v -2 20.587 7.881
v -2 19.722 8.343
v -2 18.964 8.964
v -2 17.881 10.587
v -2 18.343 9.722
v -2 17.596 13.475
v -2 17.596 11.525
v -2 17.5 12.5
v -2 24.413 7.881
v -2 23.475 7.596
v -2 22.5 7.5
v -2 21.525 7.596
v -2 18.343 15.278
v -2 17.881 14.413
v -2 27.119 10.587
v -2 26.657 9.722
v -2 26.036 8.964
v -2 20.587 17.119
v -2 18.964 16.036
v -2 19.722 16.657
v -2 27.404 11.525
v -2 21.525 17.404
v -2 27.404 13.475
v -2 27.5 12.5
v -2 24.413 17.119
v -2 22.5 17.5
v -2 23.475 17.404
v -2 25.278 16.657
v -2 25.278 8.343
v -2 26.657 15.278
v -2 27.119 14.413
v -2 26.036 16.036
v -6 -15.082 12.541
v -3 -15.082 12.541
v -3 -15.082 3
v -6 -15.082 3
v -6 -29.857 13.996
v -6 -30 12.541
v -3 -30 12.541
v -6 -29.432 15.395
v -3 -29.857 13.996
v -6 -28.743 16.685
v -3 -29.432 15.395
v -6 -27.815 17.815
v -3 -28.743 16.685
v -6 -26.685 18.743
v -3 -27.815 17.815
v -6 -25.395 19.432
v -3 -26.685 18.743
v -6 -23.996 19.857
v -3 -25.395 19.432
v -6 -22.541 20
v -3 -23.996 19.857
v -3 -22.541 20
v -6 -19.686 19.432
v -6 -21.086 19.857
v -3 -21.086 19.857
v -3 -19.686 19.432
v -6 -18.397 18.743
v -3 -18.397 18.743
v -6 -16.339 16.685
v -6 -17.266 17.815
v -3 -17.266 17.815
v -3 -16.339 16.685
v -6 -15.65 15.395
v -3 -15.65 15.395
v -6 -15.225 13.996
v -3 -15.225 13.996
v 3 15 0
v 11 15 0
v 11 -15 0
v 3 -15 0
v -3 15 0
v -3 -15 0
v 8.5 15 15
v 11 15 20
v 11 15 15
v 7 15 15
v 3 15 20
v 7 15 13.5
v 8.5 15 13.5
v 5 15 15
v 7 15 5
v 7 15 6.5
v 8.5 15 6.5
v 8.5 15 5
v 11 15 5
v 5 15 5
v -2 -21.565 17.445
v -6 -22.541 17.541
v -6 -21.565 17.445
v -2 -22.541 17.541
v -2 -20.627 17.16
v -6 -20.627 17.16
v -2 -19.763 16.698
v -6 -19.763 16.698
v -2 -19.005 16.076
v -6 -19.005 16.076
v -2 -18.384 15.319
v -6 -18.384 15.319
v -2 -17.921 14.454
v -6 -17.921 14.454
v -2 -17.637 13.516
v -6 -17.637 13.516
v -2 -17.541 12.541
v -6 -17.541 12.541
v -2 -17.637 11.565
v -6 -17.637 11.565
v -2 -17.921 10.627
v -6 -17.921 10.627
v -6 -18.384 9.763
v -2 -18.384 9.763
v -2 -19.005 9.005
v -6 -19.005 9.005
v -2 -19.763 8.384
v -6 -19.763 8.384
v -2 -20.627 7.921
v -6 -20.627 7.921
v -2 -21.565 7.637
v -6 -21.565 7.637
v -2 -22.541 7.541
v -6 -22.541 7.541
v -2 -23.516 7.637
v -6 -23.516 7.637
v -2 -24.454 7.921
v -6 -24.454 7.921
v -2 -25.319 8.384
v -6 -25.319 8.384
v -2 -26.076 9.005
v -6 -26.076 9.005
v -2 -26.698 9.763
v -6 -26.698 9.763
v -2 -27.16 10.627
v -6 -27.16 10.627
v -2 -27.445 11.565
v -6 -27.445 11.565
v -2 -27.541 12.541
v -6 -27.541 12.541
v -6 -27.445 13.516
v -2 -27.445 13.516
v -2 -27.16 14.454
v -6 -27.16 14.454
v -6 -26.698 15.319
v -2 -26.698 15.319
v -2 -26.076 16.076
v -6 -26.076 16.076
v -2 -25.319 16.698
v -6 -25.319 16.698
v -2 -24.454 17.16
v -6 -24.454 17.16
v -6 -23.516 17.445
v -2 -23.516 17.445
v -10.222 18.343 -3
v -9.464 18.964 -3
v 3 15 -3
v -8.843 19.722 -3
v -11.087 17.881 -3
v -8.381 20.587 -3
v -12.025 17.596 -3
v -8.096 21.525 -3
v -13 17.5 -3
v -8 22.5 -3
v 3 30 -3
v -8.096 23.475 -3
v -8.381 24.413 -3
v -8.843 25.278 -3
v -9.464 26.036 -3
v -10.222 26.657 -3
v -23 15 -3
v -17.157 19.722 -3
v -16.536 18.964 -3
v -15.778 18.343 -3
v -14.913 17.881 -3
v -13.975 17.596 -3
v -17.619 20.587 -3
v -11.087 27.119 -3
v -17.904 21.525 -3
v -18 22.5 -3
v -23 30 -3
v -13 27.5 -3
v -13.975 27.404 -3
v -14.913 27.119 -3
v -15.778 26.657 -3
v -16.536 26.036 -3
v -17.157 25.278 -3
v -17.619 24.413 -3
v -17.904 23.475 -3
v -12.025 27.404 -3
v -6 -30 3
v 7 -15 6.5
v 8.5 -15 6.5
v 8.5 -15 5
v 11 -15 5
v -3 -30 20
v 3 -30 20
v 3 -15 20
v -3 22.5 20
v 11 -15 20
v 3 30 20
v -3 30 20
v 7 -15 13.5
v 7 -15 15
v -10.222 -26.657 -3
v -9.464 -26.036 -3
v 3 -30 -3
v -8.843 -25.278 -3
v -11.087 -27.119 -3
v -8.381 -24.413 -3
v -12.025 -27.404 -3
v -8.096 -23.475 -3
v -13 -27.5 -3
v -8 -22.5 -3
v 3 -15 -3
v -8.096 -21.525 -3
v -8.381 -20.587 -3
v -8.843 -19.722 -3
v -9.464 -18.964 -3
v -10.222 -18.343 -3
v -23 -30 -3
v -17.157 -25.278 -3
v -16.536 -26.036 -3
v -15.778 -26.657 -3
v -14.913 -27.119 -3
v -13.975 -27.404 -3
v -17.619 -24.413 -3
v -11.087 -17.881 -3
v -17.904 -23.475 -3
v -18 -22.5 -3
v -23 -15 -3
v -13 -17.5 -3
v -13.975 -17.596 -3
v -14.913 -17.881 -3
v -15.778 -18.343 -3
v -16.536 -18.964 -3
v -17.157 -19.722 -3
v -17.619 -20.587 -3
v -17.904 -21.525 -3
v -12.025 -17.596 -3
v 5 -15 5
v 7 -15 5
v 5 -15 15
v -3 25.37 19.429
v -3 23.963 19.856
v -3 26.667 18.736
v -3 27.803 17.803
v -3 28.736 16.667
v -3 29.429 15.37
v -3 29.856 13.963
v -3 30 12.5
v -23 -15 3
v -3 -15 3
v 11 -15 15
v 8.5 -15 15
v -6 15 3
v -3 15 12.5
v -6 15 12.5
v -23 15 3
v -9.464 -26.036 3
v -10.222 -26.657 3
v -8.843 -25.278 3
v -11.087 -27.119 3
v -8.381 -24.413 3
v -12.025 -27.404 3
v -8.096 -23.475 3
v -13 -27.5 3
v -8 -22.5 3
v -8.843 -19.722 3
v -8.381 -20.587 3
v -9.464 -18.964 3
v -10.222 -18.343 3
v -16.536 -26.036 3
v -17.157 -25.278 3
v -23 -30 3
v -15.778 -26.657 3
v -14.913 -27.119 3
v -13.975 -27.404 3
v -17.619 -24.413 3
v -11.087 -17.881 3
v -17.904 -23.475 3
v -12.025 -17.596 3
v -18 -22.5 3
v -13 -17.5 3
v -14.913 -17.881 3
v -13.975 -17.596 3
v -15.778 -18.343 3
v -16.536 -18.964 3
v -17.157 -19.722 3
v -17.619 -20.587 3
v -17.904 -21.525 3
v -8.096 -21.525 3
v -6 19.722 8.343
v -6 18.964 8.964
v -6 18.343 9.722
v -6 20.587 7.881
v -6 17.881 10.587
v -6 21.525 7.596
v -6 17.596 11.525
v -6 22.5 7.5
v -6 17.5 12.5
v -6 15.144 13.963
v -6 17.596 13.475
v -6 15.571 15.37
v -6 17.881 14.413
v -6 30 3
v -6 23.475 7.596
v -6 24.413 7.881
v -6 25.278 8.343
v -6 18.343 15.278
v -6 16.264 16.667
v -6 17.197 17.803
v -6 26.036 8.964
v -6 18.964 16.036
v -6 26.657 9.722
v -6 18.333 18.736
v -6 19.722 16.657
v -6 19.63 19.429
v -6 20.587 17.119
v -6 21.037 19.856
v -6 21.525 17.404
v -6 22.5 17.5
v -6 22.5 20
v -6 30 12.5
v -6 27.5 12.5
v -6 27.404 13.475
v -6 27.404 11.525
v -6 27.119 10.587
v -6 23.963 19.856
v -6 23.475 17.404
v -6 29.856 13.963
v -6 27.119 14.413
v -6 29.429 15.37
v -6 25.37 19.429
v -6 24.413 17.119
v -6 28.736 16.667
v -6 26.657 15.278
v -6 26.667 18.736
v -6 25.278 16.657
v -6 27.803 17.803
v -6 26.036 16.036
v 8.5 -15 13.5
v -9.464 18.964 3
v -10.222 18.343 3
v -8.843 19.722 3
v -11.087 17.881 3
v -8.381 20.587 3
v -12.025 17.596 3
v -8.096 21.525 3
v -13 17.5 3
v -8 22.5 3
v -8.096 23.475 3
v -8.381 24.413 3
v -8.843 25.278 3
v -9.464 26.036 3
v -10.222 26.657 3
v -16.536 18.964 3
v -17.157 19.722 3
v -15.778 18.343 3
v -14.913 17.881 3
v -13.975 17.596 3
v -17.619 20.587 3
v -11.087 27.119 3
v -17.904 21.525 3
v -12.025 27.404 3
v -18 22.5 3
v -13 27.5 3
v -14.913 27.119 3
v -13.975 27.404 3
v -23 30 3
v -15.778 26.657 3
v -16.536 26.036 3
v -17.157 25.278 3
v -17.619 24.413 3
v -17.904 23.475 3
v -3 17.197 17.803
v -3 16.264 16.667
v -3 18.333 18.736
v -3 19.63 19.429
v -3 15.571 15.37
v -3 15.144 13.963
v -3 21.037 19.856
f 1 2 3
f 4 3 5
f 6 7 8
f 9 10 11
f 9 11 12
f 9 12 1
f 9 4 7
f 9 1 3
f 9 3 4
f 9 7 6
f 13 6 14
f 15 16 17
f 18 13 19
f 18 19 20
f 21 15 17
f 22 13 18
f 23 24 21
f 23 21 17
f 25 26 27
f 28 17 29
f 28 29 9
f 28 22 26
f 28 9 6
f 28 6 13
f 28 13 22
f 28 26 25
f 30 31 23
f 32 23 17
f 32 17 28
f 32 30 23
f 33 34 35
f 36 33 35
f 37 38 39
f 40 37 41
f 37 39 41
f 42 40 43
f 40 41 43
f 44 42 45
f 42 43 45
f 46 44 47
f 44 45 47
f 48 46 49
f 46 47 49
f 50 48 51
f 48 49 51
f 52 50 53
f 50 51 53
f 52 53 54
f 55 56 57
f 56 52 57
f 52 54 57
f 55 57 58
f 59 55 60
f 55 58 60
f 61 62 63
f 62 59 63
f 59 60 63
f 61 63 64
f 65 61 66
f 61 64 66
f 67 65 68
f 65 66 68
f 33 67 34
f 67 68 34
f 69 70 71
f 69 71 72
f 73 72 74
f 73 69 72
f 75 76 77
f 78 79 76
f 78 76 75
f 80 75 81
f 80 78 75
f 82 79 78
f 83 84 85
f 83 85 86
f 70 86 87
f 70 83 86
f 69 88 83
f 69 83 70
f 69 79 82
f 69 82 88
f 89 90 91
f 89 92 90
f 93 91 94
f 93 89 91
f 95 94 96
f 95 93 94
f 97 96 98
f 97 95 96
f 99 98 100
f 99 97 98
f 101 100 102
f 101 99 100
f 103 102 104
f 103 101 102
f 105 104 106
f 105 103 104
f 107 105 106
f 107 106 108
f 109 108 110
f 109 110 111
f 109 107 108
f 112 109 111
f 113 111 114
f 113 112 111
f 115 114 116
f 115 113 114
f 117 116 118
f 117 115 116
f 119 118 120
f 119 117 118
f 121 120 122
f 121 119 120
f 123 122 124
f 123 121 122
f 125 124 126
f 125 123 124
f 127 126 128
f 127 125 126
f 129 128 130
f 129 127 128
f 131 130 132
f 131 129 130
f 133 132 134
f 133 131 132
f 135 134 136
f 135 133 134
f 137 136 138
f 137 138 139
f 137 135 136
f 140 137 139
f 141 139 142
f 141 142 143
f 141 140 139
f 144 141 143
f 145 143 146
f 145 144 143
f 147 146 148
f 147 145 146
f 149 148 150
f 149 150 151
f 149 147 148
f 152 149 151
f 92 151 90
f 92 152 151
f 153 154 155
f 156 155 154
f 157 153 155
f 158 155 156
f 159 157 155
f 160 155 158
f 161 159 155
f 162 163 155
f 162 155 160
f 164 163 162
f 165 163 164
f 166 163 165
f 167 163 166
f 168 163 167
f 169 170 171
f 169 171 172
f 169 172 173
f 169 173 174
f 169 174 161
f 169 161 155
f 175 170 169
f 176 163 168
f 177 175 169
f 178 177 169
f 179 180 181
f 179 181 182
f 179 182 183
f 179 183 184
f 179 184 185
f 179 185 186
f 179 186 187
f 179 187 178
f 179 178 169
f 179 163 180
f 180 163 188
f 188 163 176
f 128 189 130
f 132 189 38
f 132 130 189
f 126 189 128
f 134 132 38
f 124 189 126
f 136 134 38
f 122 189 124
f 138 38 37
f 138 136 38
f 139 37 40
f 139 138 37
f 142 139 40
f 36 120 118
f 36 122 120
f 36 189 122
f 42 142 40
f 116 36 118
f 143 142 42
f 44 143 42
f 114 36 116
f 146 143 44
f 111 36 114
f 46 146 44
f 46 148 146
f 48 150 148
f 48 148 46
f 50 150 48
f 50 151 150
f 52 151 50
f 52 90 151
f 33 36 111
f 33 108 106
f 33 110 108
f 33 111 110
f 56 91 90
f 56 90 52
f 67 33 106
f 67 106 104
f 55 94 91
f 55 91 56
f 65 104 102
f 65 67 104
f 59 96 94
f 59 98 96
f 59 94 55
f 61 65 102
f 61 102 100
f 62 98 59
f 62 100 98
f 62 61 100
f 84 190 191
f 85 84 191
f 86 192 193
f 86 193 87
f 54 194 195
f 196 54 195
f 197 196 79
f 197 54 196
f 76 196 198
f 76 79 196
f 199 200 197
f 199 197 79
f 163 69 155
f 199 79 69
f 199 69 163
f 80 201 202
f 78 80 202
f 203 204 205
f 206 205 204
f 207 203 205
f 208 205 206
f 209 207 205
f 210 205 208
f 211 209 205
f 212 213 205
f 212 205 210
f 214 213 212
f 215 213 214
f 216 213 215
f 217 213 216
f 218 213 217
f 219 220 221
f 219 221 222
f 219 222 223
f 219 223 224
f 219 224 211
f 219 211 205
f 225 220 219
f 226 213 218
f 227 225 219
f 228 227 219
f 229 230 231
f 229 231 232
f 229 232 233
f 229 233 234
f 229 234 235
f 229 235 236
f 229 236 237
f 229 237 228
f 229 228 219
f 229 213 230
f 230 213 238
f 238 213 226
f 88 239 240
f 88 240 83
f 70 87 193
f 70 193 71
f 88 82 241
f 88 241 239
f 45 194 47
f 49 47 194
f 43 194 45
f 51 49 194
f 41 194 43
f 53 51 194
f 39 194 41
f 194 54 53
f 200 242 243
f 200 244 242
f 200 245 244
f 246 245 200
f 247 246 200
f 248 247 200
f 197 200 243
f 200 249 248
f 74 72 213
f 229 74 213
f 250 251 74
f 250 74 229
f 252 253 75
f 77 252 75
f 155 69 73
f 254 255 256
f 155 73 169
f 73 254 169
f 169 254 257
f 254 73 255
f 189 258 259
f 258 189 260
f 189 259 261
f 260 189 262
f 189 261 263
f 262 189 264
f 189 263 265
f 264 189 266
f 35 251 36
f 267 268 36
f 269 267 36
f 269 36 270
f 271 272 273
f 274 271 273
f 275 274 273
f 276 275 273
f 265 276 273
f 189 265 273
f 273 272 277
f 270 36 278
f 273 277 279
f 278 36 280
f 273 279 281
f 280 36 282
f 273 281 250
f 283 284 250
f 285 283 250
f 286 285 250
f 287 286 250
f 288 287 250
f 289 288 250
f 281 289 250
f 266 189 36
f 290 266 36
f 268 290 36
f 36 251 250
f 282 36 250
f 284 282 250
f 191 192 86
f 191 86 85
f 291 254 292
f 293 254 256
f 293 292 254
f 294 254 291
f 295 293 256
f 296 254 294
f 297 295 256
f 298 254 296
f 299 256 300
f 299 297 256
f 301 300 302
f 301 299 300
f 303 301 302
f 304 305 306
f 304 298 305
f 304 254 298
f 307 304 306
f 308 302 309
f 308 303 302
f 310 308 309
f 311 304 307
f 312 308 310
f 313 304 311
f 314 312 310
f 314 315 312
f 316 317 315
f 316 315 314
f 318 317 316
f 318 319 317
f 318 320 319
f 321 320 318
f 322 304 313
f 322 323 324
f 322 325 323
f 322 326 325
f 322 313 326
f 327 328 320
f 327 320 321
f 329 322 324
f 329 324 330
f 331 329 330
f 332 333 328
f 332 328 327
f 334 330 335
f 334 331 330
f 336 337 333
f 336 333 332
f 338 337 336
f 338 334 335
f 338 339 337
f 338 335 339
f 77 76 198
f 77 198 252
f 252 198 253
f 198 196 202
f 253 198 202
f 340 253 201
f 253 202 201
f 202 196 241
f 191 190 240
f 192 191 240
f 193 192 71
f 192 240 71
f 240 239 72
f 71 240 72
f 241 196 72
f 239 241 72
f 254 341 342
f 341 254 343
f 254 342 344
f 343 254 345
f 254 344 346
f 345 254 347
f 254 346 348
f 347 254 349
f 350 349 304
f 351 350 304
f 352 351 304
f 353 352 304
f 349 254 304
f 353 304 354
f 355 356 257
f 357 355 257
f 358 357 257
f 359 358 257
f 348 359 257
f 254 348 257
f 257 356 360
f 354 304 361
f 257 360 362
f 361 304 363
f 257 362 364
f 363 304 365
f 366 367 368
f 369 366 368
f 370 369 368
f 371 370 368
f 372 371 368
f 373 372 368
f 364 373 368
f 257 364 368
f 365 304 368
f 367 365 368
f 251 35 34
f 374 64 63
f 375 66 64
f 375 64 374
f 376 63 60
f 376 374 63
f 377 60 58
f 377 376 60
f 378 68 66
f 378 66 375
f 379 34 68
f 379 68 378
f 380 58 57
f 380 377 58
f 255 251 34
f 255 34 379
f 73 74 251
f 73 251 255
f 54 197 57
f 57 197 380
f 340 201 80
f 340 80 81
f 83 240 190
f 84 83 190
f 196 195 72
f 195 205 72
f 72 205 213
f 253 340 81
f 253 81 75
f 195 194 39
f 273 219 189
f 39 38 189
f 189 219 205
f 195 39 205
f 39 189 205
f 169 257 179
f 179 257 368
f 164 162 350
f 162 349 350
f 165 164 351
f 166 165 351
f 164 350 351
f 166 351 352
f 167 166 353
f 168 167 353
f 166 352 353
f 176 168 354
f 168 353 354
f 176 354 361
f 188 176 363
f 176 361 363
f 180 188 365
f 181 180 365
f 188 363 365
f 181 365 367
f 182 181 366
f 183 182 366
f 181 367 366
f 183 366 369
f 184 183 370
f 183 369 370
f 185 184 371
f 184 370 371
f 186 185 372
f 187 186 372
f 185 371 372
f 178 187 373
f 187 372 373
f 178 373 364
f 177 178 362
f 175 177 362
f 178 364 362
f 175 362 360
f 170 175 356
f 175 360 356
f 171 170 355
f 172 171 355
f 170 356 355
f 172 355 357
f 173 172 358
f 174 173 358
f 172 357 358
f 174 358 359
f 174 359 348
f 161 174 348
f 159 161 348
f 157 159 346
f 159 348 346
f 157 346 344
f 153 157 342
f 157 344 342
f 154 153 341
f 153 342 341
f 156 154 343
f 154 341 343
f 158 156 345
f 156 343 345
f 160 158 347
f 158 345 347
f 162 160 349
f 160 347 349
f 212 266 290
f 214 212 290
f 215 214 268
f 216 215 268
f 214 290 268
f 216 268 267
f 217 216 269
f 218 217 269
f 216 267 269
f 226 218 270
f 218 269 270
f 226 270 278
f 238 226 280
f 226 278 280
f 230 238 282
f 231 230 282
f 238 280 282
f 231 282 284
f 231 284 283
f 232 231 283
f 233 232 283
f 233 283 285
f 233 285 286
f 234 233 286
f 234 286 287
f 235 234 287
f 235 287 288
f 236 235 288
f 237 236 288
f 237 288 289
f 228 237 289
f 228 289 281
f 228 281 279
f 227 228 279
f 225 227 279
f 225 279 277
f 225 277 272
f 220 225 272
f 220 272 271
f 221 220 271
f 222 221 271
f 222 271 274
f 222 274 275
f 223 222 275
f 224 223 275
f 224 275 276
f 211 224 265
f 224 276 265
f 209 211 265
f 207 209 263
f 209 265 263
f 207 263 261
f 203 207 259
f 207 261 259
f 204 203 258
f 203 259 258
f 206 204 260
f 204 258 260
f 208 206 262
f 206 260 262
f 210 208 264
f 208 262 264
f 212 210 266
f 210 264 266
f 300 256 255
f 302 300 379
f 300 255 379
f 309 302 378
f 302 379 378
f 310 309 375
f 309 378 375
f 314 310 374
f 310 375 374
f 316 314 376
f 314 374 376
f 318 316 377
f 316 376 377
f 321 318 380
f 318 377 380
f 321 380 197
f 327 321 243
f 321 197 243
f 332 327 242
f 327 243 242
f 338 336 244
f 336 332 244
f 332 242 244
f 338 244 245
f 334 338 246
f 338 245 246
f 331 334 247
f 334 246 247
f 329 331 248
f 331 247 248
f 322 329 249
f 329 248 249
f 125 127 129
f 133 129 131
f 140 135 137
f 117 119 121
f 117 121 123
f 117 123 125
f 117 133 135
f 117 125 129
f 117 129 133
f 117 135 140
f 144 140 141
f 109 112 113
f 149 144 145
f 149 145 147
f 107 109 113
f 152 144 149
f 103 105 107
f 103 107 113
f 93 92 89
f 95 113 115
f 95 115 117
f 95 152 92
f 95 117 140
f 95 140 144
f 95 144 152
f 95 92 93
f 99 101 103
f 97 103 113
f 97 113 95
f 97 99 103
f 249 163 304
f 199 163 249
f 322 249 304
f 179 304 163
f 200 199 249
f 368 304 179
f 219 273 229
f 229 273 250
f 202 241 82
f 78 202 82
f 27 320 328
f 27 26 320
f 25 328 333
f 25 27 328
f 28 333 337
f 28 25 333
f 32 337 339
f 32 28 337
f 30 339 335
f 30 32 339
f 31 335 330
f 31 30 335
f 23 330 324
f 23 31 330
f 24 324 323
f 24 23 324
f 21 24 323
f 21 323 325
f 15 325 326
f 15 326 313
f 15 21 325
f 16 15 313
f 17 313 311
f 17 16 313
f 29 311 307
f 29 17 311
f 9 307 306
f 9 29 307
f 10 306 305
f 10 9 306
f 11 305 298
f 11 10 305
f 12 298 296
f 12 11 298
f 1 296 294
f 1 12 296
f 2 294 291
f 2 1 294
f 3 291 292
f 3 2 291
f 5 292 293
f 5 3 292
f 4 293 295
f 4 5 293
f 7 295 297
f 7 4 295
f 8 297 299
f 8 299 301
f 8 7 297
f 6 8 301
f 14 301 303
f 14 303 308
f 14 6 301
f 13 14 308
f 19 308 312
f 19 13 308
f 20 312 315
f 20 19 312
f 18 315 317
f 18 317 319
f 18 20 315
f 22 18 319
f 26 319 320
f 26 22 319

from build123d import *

# Parameters (mm, degrees)
SKETCH_1_W          = 6
SKETCH_1_H          = 60
EXTRUDE_1_DEPTH     = 20
SKETCH_2_W          = 5
SKETCH_2_H          = 30
EXTRUDE_2_DEPTH     = 8
SKETCH_3_W          = 10
SKETCH_3_H          = 30
EXTRUDE_3_DEPTH     = 2
SKETCH_4_W          = 1.5
SKETCH_4_H          = 1.5
EXTRUDE_4_DEPTH     = 30
SKETCH_6_W          = 20
SKETCH_6_H          = 15
EXTRUDE_5_DEPTH     = 3
SKETCH_7_R          = 5
CUT_EXTRUDE_1_DEPTH = 42.448763552
SKETCH_8_R          = 7.5
SKETCH_8_R_2        = 5
SKETCH_8_R_3        = 7.459139247
EXTRUDE_7_DEPTH     = 3
CUT_EXTRUDE_START   = -1
SKETCH_10_R         = 5
CUT_EXTRUDE_3_DEPTH = 1
SKETCH_11_W         = 26
SKETCH_11_H         = 15
EXTRUDE_8_DEPTH     = 3
SKETCH_12_R         = 5
CUT_EXTRUDE_4_DEPTH = 3


with BuildPart() as part:
    # 草图1 → 凸台-拉伸1 (new body)
    with BuildSketch(Plane.XY):
        Rectangle(SKETCH_1_W, SKETCH_1_H)
    extrude(amount=EXTRUDE_1_DEPTH)

    # 草图2 → 凸台-拉伸2 (add)
    with BuildSketch(Plane(origin=(3, 0, 0), x_dir=(0, 0, -1), z_dir=(1, 0, 0))):
        with Locations((-17.5, 0)):
            Rectangle(SKETCH_2_W, SKETCH_2_H)
        with Locations((-2.5, 0)):
            Rectangle(SKETCH_2_W, SKETCH_2_H)
    extrude(amount=EXTRUDE_2_DEPTH)

    # 草图3 → 凸台-拉伸3 (add)
    with BuildSketch(Plane(origin=(3, 0, 0), x_dir=(0, 0, -1), z_dir=(1, 0, 0))):
        with Locations((-10, 0)):
            Rectangle(SKETCH_3_W, SKETCH_3_H)
    extrude(amount=EXTRUDE_3_DEPTH)

    # 草图4 → 凸台-拉伸4 (add)
    with BuildSketch(Plane.XZ.offset(15)):
        with Locations((7.75, 14.25)):
            Rectangle(SKETCH_4_W, SKETCH_4_H)
        with Locations((7.75, 5.75)):
            Rectangle(SKETCH_4_W, SKETCH_4_H)
    extrude(amount=-EXTRUDE_4_DEPTH)

    # 草图6 → 凸台-拉伸5 (add)
    with BuildSketch(Plane(origin=(0, 0, 0), x_dir=(-1, 0, 0), z_dir=(0, 0, -1))):
        with Locations((13, 22.5)):
            Rectangle(SKETCH_6_W, SKETCH_6_H)
        with Locations((13, -22.5)):
            Rectangle(SKETCH_6_W, SKETCH_6_H)
    extrude(amount=-EXTRUDE_5_DEPTH)

    # 草图7 → 切除-拉伸1 (cut, through all)
    with BuildSketch(Plane.XY.offset(3)):
        with Locations((-13, -22.5)):
            Circle(SKETCH_7_R)
        with Locations((-13, 22.5)):
            Circle(SKETCH_7_R)
    extrude(amount=-CUT_EXTRUDE_1_DEPTH, mode=Mode.SUBTRACT)

    # 草图8 → 凸台-拉伸7 (add)
    # profile 1 of 4: a face of its own
    with BuildSketch(Plane.ZY.offset(3)):
        with Locations((12.5, 22.5)):
            Circle(SKETCH_8_R)
        with Locations((12.5, 22.5)):
            Circle(SKETCH_8_R_2, mode=Mode.SUBTRACT)
    # profile 2 of 4: a face of its own
    with BuildSketch(Plane.ZY.offset(3)):
        with BuildLine():
            Line((12.5, 30), (3, 30))
            Line((3, 30), (3, 15))
            Line((3, 15), (12.5, 15))
            ThreePointArc((12.5, 15), (5, 22.5), (12.5, 30))
        make_face()
    # profile 3 of 4: a face of its own
    with BuildSketch(Plane.ZY.offset(3)):
        with BuildLine():
            Line((12.540860753, -15.081721505), (3, -15.081721505))
            Line((3, -15.081721505), (3, -30))
            Line((3, -30), (12.540860753, -30))
            ThreePointArc((12.540860753, -30), (5.081721505, -22.540860753), (12.540860753, -15.081721505))
        make_face()
    # profile 4 of 4: a face of its own
    with BuildSketch(Plane.ZY.offset(3)):
        with Locations((12.540860753, -22.540860753)):
            Circle(SKETCH_8_R_3)
        with Locations((12.540860753, -22.540860753)):
            Circle(SKETCH_8_R_2, mode=Mode.SUBTRACT)
    extrude(amount=EXTRUDE_7_DEPTH)

    # 草图10 → 切除-拉伸3 (cut)
    with BuildSketch(Plane.ZY.offset(3).offset(CUT_EXTRUDE_START)):
        with Locations((12.5, 22.5)):
            Circle(SKETCH_10_R)
        with Locations((12.540860753, -22.540860753)):
            Circle(SKETCH_10_R)
    extrude(amount=CUT_EXTRUDE_3_DEPTH, mode=Mode.SUBTRACT)

    # 草图11 → 凸台-拉伸8 (add)
    with BuildSketch(Plane(origin=(0, 0, 0), x_dir=(-1, 0, 0), z_dir=(0, 0, -1))):
        with Locations((10, 22.5)):
            Rectangle(SKETCH_11_W, SKETCH_11_H)
        with Locations((10, -22.5)):
            Rectangle(SKETCH_11_W, SKETCH_11_H)
    extrude(amount=EXTRUDE_8_DEPTH)

    # 草图12 → 切除-拉伸4 (cut)
    with BuildSketch(Plane.XY):
        with Locations((-13, 22.5)):
            Circle(SKETCH_12_R)
        with Locations((-13, -22.5)):
            Circle(SKETCH_12_R)
    extrude(amount=-CUT_EXTRUDE_4_DEPTH, mode=Mode.SUBTRACT)


solid = part.part
